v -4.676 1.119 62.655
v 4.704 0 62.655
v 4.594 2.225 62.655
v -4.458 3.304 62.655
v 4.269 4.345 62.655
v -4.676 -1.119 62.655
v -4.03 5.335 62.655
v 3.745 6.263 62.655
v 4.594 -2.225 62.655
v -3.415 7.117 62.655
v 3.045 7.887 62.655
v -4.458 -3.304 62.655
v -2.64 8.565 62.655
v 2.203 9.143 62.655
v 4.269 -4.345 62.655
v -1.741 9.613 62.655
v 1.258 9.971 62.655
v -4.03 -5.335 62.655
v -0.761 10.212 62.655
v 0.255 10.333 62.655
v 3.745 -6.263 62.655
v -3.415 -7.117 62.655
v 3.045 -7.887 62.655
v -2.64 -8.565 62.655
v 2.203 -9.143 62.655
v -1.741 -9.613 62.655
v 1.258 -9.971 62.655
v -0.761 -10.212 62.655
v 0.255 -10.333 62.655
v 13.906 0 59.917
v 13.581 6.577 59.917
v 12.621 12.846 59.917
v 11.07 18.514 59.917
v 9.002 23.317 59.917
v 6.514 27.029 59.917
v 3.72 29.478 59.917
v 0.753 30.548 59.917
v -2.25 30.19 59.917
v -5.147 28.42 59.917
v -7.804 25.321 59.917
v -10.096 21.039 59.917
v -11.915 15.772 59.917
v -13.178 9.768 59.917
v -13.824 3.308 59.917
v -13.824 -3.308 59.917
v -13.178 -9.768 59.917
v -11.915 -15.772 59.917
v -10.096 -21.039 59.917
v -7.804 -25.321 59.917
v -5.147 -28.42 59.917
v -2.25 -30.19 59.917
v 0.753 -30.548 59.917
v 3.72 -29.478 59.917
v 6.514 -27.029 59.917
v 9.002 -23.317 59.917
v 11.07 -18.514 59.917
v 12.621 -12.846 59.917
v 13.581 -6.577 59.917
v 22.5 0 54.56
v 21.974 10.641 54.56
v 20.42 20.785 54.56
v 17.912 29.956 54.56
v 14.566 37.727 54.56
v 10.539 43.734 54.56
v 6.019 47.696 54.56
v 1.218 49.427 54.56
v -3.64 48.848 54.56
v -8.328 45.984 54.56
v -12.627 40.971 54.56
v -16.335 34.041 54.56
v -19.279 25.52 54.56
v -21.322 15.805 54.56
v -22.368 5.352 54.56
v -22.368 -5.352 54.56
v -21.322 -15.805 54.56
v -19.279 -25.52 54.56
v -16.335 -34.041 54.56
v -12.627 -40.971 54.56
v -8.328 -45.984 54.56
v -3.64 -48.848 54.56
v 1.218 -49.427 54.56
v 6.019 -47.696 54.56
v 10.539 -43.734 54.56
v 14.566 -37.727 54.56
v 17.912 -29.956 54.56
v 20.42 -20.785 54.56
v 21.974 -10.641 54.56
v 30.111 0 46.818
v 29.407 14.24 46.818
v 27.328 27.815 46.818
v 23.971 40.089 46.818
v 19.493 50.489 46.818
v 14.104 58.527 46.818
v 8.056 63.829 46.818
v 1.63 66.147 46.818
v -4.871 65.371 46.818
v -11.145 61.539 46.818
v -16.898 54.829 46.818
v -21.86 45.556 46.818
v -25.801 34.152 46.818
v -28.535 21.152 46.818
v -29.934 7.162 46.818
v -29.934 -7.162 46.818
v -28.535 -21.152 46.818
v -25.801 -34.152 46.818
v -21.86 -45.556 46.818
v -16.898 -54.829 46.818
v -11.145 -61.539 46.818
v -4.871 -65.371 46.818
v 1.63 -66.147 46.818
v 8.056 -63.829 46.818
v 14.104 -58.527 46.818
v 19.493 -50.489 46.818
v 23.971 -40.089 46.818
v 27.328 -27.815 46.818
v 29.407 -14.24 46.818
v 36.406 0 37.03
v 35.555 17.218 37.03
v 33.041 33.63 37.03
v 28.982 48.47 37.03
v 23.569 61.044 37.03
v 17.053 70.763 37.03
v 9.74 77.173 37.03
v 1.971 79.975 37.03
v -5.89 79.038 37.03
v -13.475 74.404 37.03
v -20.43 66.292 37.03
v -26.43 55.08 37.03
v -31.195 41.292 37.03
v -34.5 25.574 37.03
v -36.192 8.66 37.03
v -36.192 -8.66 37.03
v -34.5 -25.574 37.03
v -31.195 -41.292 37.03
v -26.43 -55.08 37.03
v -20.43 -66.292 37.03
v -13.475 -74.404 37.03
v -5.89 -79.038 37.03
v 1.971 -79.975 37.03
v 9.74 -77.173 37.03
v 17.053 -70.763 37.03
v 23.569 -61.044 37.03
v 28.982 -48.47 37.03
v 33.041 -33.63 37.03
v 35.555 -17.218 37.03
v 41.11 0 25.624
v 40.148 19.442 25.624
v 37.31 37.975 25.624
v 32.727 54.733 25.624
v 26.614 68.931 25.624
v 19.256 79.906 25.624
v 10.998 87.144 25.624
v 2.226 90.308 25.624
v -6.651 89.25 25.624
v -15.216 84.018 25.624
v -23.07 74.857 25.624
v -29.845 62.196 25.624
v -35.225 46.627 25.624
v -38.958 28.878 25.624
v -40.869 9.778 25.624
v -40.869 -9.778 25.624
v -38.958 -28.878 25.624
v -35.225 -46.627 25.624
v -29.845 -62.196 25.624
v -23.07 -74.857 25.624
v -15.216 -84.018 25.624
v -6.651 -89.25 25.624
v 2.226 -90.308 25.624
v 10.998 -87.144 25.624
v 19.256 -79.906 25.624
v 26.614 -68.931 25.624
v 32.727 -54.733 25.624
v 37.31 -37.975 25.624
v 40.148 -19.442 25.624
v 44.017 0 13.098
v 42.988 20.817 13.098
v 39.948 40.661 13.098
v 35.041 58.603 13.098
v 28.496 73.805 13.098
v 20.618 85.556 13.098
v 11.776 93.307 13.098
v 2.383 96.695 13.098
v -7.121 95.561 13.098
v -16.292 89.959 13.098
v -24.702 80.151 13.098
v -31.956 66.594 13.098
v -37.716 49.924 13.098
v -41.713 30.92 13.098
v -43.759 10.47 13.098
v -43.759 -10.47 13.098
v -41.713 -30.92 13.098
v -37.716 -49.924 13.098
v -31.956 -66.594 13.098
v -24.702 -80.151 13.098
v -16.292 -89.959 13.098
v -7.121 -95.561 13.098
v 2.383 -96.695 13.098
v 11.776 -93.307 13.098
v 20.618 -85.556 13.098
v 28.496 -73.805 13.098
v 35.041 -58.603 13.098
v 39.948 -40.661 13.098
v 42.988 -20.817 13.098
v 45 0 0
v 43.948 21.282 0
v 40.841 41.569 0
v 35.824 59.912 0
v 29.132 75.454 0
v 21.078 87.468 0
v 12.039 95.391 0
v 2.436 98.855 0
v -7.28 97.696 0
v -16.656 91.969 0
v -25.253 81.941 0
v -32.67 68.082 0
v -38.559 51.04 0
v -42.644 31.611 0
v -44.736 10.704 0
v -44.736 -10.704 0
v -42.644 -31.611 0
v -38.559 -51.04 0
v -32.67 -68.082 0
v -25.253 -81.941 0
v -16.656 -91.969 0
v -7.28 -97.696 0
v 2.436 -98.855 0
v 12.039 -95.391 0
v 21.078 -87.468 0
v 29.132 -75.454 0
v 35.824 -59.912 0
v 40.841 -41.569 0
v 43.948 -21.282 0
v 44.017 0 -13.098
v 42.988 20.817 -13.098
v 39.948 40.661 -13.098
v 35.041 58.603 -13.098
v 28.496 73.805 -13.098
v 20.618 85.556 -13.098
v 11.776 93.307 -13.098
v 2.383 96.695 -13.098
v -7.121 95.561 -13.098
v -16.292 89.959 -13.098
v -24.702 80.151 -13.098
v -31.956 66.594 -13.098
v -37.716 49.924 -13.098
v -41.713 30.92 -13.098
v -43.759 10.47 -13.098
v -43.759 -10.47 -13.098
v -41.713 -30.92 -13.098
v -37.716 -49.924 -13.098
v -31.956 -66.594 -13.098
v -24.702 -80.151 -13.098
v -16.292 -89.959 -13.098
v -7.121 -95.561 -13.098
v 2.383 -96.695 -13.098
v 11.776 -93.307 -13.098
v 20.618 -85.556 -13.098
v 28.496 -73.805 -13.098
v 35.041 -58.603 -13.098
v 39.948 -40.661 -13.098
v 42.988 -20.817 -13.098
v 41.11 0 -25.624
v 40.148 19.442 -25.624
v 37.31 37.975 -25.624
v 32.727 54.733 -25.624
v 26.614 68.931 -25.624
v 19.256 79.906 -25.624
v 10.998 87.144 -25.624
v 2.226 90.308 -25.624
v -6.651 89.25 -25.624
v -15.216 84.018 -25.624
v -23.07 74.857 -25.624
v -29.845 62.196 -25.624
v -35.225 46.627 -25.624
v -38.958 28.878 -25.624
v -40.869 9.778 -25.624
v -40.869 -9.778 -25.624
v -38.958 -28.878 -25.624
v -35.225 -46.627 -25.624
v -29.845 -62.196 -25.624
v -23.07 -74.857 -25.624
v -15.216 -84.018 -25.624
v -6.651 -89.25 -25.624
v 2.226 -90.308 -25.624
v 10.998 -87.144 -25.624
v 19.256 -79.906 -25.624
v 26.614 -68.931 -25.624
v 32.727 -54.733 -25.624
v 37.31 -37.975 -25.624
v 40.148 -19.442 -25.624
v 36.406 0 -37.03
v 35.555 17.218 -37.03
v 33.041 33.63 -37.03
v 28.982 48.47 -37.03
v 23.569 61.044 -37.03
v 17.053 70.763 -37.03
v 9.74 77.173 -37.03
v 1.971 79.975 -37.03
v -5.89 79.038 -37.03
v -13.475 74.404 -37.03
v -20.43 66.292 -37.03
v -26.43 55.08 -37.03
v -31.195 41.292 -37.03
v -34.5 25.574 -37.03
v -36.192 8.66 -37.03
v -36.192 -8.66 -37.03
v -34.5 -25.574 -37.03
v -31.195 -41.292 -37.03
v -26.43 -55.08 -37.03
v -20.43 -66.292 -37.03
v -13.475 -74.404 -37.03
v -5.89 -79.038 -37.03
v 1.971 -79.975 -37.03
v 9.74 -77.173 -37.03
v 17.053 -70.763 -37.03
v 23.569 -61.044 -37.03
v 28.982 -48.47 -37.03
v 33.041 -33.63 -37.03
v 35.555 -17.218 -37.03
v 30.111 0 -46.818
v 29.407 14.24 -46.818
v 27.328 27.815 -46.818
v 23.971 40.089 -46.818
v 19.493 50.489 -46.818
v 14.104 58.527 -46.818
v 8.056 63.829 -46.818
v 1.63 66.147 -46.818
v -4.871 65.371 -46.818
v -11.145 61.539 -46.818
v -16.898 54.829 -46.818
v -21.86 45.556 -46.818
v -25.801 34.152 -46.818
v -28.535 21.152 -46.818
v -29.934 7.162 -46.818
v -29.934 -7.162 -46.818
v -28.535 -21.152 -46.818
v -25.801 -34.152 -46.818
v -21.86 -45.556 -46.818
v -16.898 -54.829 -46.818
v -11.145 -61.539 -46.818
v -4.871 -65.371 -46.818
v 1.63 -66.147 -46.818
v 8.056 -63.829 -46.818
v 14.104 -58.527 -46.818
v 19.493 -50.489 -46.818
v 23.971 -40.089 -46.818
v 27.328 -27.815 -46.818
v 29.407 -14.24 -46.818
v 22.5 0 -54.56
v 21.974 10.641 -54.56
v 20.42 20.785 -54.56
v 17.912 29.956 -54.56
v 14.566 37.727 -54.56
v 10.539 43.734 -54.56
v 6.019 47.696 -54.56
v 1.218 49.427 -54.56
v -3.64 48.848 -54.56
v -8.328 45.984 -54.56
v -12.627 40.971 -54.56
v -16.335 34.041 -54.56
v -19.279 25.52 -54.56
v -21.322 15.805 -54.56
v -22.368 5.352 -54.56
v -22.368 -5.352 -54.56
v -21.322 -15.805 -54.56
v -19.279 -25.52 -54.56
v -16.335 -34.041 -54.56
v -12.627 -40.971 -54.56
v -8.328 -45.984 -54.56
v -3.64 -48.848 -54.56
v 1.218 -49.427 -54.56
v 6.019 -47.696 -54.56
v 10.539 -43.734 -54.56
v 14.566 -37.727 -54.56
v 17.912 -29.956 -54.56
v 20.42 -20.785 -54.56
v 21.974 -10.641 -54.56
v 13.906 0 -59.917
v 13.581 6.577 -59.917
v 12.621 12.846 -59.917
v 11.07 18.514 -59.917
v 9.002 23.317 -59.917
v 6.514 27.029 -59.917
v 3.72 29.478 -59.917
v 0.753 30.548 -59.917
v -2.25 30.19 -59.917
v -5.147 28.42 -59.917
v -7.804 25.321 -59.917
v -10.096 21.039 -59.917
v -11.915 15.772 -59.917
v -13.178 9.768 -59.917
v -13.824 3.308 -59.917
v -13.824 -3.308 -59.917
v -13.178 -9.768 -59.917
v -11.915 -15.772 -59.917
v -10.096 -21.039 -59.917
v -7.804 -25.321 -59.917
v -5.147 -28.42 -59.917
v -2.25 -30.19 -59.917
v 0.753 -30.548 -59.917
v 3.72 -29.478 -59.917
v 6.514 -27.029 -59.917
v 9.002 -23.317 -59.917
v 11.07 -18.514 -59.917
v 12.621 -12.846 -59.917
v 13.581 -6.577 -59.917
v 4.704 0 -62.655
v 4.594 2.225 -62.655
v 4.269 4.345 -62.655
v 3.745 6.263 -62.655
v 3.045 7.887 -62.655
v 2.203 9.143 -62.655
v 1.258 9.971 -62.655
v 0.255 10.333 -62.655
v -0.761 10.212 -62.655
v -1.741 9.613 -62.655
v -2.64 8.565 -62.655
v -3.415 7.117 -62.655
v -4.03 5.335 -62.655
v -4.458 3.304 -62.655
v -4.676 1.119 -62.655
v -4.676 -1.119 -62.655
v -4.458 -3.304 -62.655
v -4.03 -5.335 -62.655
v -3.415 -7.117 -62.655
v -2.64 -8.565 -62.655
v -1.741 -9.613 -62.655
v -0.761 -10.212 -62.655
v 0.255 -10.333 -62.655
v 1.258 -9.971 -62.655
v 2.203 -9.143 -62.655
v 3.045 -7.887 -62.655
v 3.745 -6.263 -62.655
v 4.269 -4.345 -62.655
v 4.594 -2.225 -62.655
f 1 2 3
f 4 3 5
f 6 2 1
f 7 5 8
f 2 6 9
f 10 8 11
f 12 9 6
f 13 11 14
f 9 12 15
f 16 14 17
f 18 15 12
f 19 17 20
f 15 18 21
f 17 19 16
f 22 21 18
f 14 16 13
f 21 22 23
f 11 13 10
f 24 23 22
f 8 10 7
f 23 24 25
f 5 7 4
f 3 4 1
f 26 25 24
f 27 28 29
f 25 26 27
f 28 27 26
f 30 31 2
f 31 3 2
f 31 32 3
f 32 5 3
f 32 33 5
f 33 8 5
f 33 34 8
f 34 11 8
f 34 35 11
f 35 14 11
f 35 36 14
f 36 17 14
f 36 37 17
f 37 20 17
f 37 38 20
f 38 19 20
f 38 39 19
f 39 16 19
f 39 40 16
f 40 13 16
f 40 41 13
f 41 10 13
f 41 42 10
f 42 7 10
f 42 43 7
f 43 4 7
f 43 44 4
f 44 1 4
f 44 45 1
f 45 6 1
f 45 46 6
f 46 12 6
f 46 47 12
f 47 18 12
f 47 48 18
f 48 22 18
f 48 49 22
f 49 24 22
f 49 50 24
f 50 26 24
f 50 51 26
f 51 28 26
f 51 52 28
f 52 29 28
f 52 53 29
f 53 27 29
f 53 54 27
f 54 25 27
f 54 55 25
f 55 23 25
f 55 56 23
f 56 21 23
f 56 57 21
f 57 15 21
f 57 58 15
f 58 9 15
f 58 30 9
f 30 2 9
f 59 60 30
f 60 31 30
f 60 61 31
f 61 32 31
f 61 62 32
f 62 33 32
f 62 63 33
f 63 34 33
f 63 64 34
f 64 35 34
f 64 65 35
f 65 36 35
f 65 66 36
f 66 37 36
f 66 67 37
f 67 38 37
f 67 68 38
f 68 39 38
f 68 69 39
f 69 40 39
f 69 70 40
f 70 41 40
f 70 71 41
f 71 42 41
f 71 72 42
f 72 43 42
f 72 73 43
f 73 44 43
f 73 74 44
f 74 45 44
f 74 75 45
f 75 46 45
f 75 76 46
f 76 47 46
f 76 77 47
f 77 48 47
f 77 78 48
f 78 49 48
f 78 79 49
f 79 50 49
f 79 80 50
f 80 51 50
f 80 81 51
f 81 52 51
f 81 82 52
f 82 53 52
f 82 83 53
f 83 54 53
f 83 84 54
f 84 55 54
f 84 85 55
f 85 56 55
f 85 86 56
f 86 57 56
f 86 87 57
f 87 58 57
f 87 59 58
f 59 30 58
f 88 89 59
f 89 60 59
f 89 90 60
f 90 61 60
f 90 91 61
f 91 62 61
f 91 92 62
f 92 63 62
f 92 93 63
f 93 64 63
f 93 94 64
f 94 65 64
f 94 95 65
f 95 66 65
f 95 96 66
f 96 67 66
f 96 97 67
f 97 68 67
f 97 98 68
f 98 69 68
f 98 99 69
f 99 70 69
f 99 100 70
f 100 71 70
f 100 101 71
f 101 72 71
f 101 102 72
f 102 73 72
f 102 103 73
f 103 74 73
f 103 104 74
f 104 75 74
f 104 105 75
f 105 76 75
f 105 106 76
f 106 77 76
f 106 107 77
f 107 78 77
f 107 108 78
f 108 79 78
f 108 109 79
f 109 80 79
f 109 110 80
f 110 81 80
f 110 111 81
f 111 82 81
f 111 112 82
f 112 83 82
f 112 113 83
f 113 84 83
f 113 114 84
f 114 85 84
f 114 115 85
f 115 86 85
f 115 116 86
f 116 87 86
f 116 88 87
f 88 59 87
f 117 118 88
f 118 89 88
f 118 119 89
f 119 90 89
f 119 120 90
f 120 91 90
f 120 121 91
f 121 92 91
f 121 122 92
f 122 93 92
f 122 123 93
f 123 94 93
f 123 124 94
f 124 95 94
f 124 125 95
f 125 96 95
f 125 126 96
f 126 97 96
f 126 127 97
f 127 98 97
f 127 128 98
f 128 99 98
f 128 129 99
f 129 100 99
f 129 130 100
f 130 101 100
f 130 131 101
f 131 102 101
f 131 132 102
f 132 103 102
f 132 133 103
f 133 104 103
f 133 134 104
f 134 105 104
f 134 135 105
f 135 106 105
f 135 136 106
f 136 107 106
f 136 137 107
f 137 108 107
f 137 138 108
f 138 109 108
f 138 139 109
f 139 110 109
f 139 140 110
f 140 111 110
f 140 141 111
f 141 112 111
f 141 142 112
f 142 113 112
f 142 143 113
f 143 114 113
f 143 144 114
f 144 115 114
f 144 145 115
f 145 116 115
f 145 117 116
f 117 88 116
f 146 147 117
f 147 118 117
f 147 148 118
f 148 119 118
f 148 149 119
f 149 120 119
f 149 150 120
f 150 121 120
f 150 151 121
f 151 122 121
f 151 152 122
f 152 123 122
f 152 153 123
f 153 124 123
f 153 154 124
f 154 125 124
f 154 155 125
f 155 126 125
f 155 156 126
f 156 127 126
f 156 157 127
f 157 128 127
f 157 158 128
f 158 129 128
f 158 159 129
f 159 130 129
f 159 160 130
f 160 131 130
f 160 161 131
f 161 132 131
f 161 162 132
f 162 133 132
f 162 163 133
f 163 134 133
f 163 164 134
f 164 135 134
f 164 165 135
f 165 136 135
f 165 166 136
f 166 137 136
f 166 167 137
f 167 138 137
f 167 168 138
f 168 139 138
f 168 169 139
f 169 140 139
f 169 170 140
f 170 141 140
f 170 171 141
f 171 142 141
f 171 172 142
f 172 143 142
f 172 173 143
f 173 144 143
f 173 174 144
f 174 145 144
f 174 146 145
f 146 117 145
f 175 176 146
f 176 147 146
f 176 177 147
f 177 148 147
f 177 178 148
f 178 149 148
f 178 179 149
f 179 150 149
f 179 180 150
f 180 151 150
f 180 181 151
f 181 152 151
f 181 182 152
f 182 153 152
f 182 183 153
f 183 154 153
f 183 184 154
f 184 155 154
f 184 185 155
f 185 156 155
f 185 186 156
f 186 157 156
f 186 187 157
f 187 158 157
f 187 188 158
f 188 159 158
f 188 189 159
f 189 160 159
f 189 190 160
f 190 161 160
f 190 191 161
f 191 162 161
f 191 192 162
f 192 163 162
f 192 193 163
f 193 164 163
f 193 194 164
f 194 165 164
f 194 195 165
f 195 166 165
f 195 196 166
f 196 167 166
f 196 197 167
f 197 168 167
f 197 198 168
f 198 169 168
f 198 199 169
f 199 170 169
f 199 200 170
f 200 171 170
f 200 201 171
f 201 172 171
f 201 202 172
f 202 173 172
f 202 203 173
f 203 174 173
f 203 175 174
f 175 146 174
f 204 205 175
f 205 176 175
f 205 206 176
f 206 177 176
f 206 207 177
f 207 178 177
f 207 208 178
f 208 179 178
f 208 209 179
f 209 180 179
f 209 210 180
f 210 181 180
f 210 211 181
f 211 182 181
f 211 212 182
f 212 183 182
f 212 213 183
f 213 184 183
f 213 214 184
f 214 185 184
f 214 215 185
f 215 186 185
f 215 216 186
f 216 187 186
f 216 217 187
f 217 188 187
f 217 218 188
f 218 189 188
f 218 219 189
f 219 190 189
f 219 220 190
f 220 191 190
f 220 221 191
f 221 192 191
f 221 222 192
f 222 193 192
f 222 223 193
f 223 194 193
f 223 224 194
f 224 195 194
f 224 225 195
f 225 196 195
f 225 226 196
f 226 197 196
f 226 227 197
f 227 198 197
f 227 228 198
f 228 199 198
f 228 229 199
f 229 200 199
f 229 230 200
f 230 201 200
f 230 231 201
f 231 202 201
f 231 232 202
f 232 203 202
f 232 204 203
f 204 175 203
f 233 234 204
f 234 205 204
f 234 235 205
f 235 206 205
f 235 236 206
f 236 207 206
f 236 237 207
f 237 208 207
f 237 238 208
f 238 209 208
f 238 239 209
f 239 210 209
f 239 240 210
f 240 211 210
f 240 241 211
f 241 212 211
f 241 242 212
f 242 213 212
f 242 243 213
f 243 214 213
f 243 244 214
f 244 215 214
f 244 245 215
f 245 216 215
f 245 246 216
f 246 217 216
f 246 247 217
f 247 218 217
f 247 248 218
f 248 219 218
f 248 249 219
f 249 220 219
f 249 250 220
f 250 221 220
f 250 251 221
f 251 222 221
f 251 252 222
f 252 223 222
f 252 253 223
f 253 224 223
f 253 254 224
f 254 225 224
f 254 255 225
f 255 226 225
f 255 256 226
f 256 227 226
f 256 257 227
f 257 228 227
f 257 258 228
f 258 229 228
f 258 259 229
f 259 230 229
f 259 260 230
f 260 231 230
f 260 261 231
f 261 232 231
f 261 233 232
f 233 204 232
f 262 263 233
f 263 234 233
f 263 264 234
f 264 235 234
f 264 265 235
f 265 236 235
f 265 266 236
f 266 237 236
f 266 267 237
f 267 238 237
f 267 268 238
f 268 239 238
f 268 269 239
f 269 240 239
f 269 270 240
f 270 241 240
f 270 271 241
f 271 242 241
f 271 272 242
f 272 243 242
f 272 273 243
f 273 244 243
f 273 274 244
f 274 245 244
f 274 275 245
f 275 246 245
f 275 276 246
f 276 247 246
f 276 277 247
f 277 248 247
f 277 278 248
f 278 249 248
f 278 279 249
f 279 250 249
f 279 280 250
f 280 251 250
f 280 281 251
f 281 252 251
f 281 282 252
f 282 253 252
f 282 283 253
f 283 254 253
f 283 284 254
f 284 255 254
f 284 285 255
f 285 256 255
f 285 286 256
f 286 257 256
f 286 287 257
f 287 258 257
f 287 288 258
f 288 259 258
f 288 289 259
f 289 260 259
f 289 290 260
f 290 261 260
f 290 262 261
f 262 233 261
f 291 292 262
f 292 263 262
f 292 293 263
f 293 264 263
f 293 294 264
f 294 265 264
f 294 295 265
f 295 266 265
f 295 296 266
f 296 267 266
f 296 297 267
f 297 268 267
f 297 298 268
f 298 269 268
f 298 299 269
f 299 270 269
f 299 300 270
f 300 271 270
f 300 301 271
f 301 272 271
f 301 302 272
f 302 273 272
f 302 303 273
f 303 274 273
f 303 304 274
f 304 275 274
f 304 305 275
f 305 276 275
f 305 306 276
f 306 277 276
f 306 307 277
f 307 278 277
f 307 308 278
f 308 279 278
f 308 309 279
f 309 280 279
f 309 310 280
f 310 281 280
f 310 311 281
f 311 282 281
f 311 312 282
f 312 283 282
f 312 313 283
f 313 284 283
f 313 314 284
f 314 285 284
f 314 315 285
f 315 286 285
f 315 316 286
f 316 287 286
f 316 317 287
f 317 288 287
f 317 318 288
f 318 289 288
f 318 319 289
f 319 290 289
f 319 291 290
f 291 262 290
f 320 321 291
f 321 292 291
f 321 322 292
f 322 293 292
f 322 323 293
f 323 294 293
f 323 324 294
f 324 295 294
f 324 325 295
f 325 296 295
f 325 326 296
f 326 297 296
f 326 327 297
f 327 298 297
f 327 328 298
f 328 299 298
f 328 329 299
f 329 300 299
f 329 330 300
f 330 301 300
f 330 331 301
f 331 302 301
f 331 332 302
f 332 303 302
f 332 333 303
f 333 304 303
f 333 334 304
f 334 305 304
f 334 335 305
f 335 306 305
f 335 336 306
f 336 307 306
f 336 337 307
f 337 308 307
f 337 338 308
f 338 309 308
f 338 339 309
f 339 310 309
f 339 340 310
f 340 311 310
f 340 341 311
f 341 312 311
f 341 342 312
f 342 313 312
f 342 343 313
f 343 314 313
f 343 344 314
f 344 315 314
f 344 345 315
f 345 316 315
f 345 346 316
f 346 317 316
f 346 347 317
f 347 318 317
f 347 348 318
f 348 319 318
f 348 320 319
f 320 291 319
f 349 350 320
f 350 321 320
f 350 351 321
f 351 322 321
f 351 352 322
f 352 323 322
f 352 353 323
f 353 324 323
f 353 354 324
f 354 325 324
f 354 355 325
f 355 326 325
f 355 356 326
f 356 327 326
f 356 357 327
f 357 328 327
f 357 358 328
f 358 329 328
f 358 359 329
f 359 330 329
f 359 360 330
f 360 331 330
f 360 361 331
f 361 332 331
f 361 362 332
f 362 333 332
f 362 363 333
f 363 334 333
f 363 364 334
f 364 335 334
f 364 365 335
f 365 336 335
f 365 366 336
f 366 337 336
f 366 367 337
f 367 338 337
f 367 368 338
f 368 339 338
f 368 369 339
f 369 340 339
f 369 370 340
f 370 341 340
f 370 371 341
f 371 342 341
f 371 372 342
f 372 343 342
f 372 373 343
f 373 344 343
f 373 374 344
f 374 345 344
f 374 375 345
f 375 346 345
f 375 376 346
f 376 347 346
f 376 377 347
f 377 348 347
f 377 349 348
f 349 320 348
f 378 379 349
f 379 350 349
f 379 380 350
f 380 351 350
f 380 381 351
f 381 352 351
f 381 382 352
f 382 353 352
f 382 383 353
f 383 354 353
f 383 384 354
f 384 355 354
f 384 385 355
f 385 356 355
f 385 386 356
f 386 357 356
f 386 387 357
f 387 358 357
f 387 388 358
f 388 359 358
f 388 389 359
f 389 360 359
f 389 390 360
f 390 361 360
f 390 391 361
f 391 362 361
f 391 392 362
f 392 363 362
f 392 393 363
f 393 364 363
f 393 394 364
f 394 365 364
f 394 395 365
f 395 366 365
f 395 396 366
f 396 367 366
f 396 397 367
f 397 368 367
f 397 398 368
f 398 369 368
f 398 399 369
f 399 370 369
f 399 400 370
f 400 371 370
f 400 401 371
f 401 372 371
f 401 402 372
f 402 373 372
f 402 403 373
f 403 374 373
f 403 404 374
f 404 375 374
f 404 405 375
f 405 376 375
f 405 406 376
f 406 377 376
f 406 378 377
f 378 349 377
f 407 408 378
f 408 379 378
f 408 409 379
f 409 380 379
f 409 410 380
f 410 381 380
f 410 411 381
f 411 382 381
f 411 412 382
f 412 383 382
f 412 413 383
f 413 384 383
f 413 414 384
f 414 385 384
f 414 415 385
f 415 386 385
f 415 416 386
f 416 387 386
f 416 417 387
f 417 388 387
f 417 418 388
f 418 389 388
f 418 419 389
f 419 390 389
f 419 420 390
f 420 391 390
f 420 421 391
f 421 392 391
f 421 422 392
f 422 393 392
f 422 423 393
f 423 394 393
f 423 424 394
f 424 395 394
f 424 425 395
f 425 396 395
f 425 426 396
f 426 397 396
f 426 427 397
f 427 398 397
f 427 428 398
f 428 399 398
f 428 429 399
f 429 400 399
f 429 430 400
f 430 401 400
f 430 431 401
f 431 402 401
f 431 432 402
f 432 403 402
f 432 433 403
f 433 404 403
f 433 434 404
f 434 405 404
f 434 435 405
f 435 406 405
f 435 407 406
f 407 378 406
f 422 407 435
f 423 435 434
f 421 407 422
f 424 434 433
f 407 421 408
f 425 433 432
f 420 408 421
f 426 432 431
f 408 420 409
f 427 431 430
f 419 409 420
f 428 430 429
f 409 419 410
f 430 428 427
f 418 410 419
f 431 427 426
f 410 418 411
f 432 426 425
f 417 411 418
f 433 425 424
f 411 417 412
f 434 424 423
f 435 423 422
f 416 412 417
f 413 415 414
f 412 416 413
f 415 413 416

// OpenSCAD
// Generated by SolidPython 1.0.1 on 2020-07-29 00:46:46


scale(v = [5, 11, 7]) {
	sphere(r = 9);
}
/***********************************************
*********      SolidPython code:      **********
************************************************
 
# import packages: SolidPython
from solid import *
from solid.utils import *
from itertools import chain, combinations, permutations


class Resize:

    def __init__(self, scad_file):
        self.scad_file = scad_file
        #self.scad_file = import_scad(scad_file)
        # cone/cylinder param:
        self.r1 = 0
        self.r2 = 0
        self.h = 0
        # rectangular prism param:
        self.w = 0
        self.l = 0
        # ellipse param:
        self.r = 0

    # import OpenScad code (file name corresponds to shape)


    # classify shape + parameters
    def assign(self, param1, param2, param3):
        if self.scad_file == 'cone.scad':
            self.r1 = param1
            self.r2 = param2
            self.h = param3
        elif self.scad_file == 'cylinder.scad':
            self.r1 = param1
            self.r2 = param2
            self.h = param3
        elif self.scad_file == 'rectangularPrism.scad':
            self.h = param1
            self.l = param2
            self.w = param3
        else:
            self.r = param1
            self.h = param2

    # resize parameters
    def iterate(self):
        x = range(3, 20, 2)
        i = 1
        if self.scad_file == 'cone.scad':
            tempList = list(permutations(x, 2))
            for temp in tempList:
                param1 = temp[0]
                param2 = temp[1]
                filepath = 'produced_scad_files/' + 'cone' + str(param1) + '_' + str(param2) + '_' + '.scad'
                scad_render_to_file(cylinder(h=param1, r1=param2, r2=0), filepath)

        elif self.scad_file == 'cylinder.scad':
            tempList = list(permutations(x, 3))
            for temp in tempList:
                param1 = temp[0]
                param2 = temp[1]
                filepath = 'produced_scad_files/' + 'cylinder' + str(param1) + '_' + str(param2) + '_' + '.scad'
                scad_render_to_file(cylinder(h=param1, r1=param2, r2=param2), filepath)

        elif self.scad_file == 'rectangularPrism.scad':
            tempList = list(permutations(x, 3))
            for temp in tempList:
                param1 = temp[0]
                param2 = temp[1]
                param3 = temp[2]
                filepath = 'produced_scad_files/' + 'rectangularPrism' + str(param1) + '_' + str(param2) + '_' + str(
                    param3) + '.scad'
                scad_render_to_file(cube(size=(param1, param2, param3)), filepath)

        elif self.scad_file == 'ellipse.scad':
            tempList = list(permutations(x, 4))
            for temp in tempList:
                param1 = temp[0]
                param2 = temp[1]
                param3 = temp[2]
                param4 = temp[3]
                filepath = 'produced_scad_files/' + 'ellipse' + str(param1) + '_' + str(param2) + '_' + str(param3) + '_' + str(param4) + '.scad'
                scad_render_to_file(scale([param1, param2, param3])(sphere(r=param4)), filepath)

    def render_to_scadfile(self):
        scad_render_to_file(scad, 'example.scad') 
 
************************************************/
